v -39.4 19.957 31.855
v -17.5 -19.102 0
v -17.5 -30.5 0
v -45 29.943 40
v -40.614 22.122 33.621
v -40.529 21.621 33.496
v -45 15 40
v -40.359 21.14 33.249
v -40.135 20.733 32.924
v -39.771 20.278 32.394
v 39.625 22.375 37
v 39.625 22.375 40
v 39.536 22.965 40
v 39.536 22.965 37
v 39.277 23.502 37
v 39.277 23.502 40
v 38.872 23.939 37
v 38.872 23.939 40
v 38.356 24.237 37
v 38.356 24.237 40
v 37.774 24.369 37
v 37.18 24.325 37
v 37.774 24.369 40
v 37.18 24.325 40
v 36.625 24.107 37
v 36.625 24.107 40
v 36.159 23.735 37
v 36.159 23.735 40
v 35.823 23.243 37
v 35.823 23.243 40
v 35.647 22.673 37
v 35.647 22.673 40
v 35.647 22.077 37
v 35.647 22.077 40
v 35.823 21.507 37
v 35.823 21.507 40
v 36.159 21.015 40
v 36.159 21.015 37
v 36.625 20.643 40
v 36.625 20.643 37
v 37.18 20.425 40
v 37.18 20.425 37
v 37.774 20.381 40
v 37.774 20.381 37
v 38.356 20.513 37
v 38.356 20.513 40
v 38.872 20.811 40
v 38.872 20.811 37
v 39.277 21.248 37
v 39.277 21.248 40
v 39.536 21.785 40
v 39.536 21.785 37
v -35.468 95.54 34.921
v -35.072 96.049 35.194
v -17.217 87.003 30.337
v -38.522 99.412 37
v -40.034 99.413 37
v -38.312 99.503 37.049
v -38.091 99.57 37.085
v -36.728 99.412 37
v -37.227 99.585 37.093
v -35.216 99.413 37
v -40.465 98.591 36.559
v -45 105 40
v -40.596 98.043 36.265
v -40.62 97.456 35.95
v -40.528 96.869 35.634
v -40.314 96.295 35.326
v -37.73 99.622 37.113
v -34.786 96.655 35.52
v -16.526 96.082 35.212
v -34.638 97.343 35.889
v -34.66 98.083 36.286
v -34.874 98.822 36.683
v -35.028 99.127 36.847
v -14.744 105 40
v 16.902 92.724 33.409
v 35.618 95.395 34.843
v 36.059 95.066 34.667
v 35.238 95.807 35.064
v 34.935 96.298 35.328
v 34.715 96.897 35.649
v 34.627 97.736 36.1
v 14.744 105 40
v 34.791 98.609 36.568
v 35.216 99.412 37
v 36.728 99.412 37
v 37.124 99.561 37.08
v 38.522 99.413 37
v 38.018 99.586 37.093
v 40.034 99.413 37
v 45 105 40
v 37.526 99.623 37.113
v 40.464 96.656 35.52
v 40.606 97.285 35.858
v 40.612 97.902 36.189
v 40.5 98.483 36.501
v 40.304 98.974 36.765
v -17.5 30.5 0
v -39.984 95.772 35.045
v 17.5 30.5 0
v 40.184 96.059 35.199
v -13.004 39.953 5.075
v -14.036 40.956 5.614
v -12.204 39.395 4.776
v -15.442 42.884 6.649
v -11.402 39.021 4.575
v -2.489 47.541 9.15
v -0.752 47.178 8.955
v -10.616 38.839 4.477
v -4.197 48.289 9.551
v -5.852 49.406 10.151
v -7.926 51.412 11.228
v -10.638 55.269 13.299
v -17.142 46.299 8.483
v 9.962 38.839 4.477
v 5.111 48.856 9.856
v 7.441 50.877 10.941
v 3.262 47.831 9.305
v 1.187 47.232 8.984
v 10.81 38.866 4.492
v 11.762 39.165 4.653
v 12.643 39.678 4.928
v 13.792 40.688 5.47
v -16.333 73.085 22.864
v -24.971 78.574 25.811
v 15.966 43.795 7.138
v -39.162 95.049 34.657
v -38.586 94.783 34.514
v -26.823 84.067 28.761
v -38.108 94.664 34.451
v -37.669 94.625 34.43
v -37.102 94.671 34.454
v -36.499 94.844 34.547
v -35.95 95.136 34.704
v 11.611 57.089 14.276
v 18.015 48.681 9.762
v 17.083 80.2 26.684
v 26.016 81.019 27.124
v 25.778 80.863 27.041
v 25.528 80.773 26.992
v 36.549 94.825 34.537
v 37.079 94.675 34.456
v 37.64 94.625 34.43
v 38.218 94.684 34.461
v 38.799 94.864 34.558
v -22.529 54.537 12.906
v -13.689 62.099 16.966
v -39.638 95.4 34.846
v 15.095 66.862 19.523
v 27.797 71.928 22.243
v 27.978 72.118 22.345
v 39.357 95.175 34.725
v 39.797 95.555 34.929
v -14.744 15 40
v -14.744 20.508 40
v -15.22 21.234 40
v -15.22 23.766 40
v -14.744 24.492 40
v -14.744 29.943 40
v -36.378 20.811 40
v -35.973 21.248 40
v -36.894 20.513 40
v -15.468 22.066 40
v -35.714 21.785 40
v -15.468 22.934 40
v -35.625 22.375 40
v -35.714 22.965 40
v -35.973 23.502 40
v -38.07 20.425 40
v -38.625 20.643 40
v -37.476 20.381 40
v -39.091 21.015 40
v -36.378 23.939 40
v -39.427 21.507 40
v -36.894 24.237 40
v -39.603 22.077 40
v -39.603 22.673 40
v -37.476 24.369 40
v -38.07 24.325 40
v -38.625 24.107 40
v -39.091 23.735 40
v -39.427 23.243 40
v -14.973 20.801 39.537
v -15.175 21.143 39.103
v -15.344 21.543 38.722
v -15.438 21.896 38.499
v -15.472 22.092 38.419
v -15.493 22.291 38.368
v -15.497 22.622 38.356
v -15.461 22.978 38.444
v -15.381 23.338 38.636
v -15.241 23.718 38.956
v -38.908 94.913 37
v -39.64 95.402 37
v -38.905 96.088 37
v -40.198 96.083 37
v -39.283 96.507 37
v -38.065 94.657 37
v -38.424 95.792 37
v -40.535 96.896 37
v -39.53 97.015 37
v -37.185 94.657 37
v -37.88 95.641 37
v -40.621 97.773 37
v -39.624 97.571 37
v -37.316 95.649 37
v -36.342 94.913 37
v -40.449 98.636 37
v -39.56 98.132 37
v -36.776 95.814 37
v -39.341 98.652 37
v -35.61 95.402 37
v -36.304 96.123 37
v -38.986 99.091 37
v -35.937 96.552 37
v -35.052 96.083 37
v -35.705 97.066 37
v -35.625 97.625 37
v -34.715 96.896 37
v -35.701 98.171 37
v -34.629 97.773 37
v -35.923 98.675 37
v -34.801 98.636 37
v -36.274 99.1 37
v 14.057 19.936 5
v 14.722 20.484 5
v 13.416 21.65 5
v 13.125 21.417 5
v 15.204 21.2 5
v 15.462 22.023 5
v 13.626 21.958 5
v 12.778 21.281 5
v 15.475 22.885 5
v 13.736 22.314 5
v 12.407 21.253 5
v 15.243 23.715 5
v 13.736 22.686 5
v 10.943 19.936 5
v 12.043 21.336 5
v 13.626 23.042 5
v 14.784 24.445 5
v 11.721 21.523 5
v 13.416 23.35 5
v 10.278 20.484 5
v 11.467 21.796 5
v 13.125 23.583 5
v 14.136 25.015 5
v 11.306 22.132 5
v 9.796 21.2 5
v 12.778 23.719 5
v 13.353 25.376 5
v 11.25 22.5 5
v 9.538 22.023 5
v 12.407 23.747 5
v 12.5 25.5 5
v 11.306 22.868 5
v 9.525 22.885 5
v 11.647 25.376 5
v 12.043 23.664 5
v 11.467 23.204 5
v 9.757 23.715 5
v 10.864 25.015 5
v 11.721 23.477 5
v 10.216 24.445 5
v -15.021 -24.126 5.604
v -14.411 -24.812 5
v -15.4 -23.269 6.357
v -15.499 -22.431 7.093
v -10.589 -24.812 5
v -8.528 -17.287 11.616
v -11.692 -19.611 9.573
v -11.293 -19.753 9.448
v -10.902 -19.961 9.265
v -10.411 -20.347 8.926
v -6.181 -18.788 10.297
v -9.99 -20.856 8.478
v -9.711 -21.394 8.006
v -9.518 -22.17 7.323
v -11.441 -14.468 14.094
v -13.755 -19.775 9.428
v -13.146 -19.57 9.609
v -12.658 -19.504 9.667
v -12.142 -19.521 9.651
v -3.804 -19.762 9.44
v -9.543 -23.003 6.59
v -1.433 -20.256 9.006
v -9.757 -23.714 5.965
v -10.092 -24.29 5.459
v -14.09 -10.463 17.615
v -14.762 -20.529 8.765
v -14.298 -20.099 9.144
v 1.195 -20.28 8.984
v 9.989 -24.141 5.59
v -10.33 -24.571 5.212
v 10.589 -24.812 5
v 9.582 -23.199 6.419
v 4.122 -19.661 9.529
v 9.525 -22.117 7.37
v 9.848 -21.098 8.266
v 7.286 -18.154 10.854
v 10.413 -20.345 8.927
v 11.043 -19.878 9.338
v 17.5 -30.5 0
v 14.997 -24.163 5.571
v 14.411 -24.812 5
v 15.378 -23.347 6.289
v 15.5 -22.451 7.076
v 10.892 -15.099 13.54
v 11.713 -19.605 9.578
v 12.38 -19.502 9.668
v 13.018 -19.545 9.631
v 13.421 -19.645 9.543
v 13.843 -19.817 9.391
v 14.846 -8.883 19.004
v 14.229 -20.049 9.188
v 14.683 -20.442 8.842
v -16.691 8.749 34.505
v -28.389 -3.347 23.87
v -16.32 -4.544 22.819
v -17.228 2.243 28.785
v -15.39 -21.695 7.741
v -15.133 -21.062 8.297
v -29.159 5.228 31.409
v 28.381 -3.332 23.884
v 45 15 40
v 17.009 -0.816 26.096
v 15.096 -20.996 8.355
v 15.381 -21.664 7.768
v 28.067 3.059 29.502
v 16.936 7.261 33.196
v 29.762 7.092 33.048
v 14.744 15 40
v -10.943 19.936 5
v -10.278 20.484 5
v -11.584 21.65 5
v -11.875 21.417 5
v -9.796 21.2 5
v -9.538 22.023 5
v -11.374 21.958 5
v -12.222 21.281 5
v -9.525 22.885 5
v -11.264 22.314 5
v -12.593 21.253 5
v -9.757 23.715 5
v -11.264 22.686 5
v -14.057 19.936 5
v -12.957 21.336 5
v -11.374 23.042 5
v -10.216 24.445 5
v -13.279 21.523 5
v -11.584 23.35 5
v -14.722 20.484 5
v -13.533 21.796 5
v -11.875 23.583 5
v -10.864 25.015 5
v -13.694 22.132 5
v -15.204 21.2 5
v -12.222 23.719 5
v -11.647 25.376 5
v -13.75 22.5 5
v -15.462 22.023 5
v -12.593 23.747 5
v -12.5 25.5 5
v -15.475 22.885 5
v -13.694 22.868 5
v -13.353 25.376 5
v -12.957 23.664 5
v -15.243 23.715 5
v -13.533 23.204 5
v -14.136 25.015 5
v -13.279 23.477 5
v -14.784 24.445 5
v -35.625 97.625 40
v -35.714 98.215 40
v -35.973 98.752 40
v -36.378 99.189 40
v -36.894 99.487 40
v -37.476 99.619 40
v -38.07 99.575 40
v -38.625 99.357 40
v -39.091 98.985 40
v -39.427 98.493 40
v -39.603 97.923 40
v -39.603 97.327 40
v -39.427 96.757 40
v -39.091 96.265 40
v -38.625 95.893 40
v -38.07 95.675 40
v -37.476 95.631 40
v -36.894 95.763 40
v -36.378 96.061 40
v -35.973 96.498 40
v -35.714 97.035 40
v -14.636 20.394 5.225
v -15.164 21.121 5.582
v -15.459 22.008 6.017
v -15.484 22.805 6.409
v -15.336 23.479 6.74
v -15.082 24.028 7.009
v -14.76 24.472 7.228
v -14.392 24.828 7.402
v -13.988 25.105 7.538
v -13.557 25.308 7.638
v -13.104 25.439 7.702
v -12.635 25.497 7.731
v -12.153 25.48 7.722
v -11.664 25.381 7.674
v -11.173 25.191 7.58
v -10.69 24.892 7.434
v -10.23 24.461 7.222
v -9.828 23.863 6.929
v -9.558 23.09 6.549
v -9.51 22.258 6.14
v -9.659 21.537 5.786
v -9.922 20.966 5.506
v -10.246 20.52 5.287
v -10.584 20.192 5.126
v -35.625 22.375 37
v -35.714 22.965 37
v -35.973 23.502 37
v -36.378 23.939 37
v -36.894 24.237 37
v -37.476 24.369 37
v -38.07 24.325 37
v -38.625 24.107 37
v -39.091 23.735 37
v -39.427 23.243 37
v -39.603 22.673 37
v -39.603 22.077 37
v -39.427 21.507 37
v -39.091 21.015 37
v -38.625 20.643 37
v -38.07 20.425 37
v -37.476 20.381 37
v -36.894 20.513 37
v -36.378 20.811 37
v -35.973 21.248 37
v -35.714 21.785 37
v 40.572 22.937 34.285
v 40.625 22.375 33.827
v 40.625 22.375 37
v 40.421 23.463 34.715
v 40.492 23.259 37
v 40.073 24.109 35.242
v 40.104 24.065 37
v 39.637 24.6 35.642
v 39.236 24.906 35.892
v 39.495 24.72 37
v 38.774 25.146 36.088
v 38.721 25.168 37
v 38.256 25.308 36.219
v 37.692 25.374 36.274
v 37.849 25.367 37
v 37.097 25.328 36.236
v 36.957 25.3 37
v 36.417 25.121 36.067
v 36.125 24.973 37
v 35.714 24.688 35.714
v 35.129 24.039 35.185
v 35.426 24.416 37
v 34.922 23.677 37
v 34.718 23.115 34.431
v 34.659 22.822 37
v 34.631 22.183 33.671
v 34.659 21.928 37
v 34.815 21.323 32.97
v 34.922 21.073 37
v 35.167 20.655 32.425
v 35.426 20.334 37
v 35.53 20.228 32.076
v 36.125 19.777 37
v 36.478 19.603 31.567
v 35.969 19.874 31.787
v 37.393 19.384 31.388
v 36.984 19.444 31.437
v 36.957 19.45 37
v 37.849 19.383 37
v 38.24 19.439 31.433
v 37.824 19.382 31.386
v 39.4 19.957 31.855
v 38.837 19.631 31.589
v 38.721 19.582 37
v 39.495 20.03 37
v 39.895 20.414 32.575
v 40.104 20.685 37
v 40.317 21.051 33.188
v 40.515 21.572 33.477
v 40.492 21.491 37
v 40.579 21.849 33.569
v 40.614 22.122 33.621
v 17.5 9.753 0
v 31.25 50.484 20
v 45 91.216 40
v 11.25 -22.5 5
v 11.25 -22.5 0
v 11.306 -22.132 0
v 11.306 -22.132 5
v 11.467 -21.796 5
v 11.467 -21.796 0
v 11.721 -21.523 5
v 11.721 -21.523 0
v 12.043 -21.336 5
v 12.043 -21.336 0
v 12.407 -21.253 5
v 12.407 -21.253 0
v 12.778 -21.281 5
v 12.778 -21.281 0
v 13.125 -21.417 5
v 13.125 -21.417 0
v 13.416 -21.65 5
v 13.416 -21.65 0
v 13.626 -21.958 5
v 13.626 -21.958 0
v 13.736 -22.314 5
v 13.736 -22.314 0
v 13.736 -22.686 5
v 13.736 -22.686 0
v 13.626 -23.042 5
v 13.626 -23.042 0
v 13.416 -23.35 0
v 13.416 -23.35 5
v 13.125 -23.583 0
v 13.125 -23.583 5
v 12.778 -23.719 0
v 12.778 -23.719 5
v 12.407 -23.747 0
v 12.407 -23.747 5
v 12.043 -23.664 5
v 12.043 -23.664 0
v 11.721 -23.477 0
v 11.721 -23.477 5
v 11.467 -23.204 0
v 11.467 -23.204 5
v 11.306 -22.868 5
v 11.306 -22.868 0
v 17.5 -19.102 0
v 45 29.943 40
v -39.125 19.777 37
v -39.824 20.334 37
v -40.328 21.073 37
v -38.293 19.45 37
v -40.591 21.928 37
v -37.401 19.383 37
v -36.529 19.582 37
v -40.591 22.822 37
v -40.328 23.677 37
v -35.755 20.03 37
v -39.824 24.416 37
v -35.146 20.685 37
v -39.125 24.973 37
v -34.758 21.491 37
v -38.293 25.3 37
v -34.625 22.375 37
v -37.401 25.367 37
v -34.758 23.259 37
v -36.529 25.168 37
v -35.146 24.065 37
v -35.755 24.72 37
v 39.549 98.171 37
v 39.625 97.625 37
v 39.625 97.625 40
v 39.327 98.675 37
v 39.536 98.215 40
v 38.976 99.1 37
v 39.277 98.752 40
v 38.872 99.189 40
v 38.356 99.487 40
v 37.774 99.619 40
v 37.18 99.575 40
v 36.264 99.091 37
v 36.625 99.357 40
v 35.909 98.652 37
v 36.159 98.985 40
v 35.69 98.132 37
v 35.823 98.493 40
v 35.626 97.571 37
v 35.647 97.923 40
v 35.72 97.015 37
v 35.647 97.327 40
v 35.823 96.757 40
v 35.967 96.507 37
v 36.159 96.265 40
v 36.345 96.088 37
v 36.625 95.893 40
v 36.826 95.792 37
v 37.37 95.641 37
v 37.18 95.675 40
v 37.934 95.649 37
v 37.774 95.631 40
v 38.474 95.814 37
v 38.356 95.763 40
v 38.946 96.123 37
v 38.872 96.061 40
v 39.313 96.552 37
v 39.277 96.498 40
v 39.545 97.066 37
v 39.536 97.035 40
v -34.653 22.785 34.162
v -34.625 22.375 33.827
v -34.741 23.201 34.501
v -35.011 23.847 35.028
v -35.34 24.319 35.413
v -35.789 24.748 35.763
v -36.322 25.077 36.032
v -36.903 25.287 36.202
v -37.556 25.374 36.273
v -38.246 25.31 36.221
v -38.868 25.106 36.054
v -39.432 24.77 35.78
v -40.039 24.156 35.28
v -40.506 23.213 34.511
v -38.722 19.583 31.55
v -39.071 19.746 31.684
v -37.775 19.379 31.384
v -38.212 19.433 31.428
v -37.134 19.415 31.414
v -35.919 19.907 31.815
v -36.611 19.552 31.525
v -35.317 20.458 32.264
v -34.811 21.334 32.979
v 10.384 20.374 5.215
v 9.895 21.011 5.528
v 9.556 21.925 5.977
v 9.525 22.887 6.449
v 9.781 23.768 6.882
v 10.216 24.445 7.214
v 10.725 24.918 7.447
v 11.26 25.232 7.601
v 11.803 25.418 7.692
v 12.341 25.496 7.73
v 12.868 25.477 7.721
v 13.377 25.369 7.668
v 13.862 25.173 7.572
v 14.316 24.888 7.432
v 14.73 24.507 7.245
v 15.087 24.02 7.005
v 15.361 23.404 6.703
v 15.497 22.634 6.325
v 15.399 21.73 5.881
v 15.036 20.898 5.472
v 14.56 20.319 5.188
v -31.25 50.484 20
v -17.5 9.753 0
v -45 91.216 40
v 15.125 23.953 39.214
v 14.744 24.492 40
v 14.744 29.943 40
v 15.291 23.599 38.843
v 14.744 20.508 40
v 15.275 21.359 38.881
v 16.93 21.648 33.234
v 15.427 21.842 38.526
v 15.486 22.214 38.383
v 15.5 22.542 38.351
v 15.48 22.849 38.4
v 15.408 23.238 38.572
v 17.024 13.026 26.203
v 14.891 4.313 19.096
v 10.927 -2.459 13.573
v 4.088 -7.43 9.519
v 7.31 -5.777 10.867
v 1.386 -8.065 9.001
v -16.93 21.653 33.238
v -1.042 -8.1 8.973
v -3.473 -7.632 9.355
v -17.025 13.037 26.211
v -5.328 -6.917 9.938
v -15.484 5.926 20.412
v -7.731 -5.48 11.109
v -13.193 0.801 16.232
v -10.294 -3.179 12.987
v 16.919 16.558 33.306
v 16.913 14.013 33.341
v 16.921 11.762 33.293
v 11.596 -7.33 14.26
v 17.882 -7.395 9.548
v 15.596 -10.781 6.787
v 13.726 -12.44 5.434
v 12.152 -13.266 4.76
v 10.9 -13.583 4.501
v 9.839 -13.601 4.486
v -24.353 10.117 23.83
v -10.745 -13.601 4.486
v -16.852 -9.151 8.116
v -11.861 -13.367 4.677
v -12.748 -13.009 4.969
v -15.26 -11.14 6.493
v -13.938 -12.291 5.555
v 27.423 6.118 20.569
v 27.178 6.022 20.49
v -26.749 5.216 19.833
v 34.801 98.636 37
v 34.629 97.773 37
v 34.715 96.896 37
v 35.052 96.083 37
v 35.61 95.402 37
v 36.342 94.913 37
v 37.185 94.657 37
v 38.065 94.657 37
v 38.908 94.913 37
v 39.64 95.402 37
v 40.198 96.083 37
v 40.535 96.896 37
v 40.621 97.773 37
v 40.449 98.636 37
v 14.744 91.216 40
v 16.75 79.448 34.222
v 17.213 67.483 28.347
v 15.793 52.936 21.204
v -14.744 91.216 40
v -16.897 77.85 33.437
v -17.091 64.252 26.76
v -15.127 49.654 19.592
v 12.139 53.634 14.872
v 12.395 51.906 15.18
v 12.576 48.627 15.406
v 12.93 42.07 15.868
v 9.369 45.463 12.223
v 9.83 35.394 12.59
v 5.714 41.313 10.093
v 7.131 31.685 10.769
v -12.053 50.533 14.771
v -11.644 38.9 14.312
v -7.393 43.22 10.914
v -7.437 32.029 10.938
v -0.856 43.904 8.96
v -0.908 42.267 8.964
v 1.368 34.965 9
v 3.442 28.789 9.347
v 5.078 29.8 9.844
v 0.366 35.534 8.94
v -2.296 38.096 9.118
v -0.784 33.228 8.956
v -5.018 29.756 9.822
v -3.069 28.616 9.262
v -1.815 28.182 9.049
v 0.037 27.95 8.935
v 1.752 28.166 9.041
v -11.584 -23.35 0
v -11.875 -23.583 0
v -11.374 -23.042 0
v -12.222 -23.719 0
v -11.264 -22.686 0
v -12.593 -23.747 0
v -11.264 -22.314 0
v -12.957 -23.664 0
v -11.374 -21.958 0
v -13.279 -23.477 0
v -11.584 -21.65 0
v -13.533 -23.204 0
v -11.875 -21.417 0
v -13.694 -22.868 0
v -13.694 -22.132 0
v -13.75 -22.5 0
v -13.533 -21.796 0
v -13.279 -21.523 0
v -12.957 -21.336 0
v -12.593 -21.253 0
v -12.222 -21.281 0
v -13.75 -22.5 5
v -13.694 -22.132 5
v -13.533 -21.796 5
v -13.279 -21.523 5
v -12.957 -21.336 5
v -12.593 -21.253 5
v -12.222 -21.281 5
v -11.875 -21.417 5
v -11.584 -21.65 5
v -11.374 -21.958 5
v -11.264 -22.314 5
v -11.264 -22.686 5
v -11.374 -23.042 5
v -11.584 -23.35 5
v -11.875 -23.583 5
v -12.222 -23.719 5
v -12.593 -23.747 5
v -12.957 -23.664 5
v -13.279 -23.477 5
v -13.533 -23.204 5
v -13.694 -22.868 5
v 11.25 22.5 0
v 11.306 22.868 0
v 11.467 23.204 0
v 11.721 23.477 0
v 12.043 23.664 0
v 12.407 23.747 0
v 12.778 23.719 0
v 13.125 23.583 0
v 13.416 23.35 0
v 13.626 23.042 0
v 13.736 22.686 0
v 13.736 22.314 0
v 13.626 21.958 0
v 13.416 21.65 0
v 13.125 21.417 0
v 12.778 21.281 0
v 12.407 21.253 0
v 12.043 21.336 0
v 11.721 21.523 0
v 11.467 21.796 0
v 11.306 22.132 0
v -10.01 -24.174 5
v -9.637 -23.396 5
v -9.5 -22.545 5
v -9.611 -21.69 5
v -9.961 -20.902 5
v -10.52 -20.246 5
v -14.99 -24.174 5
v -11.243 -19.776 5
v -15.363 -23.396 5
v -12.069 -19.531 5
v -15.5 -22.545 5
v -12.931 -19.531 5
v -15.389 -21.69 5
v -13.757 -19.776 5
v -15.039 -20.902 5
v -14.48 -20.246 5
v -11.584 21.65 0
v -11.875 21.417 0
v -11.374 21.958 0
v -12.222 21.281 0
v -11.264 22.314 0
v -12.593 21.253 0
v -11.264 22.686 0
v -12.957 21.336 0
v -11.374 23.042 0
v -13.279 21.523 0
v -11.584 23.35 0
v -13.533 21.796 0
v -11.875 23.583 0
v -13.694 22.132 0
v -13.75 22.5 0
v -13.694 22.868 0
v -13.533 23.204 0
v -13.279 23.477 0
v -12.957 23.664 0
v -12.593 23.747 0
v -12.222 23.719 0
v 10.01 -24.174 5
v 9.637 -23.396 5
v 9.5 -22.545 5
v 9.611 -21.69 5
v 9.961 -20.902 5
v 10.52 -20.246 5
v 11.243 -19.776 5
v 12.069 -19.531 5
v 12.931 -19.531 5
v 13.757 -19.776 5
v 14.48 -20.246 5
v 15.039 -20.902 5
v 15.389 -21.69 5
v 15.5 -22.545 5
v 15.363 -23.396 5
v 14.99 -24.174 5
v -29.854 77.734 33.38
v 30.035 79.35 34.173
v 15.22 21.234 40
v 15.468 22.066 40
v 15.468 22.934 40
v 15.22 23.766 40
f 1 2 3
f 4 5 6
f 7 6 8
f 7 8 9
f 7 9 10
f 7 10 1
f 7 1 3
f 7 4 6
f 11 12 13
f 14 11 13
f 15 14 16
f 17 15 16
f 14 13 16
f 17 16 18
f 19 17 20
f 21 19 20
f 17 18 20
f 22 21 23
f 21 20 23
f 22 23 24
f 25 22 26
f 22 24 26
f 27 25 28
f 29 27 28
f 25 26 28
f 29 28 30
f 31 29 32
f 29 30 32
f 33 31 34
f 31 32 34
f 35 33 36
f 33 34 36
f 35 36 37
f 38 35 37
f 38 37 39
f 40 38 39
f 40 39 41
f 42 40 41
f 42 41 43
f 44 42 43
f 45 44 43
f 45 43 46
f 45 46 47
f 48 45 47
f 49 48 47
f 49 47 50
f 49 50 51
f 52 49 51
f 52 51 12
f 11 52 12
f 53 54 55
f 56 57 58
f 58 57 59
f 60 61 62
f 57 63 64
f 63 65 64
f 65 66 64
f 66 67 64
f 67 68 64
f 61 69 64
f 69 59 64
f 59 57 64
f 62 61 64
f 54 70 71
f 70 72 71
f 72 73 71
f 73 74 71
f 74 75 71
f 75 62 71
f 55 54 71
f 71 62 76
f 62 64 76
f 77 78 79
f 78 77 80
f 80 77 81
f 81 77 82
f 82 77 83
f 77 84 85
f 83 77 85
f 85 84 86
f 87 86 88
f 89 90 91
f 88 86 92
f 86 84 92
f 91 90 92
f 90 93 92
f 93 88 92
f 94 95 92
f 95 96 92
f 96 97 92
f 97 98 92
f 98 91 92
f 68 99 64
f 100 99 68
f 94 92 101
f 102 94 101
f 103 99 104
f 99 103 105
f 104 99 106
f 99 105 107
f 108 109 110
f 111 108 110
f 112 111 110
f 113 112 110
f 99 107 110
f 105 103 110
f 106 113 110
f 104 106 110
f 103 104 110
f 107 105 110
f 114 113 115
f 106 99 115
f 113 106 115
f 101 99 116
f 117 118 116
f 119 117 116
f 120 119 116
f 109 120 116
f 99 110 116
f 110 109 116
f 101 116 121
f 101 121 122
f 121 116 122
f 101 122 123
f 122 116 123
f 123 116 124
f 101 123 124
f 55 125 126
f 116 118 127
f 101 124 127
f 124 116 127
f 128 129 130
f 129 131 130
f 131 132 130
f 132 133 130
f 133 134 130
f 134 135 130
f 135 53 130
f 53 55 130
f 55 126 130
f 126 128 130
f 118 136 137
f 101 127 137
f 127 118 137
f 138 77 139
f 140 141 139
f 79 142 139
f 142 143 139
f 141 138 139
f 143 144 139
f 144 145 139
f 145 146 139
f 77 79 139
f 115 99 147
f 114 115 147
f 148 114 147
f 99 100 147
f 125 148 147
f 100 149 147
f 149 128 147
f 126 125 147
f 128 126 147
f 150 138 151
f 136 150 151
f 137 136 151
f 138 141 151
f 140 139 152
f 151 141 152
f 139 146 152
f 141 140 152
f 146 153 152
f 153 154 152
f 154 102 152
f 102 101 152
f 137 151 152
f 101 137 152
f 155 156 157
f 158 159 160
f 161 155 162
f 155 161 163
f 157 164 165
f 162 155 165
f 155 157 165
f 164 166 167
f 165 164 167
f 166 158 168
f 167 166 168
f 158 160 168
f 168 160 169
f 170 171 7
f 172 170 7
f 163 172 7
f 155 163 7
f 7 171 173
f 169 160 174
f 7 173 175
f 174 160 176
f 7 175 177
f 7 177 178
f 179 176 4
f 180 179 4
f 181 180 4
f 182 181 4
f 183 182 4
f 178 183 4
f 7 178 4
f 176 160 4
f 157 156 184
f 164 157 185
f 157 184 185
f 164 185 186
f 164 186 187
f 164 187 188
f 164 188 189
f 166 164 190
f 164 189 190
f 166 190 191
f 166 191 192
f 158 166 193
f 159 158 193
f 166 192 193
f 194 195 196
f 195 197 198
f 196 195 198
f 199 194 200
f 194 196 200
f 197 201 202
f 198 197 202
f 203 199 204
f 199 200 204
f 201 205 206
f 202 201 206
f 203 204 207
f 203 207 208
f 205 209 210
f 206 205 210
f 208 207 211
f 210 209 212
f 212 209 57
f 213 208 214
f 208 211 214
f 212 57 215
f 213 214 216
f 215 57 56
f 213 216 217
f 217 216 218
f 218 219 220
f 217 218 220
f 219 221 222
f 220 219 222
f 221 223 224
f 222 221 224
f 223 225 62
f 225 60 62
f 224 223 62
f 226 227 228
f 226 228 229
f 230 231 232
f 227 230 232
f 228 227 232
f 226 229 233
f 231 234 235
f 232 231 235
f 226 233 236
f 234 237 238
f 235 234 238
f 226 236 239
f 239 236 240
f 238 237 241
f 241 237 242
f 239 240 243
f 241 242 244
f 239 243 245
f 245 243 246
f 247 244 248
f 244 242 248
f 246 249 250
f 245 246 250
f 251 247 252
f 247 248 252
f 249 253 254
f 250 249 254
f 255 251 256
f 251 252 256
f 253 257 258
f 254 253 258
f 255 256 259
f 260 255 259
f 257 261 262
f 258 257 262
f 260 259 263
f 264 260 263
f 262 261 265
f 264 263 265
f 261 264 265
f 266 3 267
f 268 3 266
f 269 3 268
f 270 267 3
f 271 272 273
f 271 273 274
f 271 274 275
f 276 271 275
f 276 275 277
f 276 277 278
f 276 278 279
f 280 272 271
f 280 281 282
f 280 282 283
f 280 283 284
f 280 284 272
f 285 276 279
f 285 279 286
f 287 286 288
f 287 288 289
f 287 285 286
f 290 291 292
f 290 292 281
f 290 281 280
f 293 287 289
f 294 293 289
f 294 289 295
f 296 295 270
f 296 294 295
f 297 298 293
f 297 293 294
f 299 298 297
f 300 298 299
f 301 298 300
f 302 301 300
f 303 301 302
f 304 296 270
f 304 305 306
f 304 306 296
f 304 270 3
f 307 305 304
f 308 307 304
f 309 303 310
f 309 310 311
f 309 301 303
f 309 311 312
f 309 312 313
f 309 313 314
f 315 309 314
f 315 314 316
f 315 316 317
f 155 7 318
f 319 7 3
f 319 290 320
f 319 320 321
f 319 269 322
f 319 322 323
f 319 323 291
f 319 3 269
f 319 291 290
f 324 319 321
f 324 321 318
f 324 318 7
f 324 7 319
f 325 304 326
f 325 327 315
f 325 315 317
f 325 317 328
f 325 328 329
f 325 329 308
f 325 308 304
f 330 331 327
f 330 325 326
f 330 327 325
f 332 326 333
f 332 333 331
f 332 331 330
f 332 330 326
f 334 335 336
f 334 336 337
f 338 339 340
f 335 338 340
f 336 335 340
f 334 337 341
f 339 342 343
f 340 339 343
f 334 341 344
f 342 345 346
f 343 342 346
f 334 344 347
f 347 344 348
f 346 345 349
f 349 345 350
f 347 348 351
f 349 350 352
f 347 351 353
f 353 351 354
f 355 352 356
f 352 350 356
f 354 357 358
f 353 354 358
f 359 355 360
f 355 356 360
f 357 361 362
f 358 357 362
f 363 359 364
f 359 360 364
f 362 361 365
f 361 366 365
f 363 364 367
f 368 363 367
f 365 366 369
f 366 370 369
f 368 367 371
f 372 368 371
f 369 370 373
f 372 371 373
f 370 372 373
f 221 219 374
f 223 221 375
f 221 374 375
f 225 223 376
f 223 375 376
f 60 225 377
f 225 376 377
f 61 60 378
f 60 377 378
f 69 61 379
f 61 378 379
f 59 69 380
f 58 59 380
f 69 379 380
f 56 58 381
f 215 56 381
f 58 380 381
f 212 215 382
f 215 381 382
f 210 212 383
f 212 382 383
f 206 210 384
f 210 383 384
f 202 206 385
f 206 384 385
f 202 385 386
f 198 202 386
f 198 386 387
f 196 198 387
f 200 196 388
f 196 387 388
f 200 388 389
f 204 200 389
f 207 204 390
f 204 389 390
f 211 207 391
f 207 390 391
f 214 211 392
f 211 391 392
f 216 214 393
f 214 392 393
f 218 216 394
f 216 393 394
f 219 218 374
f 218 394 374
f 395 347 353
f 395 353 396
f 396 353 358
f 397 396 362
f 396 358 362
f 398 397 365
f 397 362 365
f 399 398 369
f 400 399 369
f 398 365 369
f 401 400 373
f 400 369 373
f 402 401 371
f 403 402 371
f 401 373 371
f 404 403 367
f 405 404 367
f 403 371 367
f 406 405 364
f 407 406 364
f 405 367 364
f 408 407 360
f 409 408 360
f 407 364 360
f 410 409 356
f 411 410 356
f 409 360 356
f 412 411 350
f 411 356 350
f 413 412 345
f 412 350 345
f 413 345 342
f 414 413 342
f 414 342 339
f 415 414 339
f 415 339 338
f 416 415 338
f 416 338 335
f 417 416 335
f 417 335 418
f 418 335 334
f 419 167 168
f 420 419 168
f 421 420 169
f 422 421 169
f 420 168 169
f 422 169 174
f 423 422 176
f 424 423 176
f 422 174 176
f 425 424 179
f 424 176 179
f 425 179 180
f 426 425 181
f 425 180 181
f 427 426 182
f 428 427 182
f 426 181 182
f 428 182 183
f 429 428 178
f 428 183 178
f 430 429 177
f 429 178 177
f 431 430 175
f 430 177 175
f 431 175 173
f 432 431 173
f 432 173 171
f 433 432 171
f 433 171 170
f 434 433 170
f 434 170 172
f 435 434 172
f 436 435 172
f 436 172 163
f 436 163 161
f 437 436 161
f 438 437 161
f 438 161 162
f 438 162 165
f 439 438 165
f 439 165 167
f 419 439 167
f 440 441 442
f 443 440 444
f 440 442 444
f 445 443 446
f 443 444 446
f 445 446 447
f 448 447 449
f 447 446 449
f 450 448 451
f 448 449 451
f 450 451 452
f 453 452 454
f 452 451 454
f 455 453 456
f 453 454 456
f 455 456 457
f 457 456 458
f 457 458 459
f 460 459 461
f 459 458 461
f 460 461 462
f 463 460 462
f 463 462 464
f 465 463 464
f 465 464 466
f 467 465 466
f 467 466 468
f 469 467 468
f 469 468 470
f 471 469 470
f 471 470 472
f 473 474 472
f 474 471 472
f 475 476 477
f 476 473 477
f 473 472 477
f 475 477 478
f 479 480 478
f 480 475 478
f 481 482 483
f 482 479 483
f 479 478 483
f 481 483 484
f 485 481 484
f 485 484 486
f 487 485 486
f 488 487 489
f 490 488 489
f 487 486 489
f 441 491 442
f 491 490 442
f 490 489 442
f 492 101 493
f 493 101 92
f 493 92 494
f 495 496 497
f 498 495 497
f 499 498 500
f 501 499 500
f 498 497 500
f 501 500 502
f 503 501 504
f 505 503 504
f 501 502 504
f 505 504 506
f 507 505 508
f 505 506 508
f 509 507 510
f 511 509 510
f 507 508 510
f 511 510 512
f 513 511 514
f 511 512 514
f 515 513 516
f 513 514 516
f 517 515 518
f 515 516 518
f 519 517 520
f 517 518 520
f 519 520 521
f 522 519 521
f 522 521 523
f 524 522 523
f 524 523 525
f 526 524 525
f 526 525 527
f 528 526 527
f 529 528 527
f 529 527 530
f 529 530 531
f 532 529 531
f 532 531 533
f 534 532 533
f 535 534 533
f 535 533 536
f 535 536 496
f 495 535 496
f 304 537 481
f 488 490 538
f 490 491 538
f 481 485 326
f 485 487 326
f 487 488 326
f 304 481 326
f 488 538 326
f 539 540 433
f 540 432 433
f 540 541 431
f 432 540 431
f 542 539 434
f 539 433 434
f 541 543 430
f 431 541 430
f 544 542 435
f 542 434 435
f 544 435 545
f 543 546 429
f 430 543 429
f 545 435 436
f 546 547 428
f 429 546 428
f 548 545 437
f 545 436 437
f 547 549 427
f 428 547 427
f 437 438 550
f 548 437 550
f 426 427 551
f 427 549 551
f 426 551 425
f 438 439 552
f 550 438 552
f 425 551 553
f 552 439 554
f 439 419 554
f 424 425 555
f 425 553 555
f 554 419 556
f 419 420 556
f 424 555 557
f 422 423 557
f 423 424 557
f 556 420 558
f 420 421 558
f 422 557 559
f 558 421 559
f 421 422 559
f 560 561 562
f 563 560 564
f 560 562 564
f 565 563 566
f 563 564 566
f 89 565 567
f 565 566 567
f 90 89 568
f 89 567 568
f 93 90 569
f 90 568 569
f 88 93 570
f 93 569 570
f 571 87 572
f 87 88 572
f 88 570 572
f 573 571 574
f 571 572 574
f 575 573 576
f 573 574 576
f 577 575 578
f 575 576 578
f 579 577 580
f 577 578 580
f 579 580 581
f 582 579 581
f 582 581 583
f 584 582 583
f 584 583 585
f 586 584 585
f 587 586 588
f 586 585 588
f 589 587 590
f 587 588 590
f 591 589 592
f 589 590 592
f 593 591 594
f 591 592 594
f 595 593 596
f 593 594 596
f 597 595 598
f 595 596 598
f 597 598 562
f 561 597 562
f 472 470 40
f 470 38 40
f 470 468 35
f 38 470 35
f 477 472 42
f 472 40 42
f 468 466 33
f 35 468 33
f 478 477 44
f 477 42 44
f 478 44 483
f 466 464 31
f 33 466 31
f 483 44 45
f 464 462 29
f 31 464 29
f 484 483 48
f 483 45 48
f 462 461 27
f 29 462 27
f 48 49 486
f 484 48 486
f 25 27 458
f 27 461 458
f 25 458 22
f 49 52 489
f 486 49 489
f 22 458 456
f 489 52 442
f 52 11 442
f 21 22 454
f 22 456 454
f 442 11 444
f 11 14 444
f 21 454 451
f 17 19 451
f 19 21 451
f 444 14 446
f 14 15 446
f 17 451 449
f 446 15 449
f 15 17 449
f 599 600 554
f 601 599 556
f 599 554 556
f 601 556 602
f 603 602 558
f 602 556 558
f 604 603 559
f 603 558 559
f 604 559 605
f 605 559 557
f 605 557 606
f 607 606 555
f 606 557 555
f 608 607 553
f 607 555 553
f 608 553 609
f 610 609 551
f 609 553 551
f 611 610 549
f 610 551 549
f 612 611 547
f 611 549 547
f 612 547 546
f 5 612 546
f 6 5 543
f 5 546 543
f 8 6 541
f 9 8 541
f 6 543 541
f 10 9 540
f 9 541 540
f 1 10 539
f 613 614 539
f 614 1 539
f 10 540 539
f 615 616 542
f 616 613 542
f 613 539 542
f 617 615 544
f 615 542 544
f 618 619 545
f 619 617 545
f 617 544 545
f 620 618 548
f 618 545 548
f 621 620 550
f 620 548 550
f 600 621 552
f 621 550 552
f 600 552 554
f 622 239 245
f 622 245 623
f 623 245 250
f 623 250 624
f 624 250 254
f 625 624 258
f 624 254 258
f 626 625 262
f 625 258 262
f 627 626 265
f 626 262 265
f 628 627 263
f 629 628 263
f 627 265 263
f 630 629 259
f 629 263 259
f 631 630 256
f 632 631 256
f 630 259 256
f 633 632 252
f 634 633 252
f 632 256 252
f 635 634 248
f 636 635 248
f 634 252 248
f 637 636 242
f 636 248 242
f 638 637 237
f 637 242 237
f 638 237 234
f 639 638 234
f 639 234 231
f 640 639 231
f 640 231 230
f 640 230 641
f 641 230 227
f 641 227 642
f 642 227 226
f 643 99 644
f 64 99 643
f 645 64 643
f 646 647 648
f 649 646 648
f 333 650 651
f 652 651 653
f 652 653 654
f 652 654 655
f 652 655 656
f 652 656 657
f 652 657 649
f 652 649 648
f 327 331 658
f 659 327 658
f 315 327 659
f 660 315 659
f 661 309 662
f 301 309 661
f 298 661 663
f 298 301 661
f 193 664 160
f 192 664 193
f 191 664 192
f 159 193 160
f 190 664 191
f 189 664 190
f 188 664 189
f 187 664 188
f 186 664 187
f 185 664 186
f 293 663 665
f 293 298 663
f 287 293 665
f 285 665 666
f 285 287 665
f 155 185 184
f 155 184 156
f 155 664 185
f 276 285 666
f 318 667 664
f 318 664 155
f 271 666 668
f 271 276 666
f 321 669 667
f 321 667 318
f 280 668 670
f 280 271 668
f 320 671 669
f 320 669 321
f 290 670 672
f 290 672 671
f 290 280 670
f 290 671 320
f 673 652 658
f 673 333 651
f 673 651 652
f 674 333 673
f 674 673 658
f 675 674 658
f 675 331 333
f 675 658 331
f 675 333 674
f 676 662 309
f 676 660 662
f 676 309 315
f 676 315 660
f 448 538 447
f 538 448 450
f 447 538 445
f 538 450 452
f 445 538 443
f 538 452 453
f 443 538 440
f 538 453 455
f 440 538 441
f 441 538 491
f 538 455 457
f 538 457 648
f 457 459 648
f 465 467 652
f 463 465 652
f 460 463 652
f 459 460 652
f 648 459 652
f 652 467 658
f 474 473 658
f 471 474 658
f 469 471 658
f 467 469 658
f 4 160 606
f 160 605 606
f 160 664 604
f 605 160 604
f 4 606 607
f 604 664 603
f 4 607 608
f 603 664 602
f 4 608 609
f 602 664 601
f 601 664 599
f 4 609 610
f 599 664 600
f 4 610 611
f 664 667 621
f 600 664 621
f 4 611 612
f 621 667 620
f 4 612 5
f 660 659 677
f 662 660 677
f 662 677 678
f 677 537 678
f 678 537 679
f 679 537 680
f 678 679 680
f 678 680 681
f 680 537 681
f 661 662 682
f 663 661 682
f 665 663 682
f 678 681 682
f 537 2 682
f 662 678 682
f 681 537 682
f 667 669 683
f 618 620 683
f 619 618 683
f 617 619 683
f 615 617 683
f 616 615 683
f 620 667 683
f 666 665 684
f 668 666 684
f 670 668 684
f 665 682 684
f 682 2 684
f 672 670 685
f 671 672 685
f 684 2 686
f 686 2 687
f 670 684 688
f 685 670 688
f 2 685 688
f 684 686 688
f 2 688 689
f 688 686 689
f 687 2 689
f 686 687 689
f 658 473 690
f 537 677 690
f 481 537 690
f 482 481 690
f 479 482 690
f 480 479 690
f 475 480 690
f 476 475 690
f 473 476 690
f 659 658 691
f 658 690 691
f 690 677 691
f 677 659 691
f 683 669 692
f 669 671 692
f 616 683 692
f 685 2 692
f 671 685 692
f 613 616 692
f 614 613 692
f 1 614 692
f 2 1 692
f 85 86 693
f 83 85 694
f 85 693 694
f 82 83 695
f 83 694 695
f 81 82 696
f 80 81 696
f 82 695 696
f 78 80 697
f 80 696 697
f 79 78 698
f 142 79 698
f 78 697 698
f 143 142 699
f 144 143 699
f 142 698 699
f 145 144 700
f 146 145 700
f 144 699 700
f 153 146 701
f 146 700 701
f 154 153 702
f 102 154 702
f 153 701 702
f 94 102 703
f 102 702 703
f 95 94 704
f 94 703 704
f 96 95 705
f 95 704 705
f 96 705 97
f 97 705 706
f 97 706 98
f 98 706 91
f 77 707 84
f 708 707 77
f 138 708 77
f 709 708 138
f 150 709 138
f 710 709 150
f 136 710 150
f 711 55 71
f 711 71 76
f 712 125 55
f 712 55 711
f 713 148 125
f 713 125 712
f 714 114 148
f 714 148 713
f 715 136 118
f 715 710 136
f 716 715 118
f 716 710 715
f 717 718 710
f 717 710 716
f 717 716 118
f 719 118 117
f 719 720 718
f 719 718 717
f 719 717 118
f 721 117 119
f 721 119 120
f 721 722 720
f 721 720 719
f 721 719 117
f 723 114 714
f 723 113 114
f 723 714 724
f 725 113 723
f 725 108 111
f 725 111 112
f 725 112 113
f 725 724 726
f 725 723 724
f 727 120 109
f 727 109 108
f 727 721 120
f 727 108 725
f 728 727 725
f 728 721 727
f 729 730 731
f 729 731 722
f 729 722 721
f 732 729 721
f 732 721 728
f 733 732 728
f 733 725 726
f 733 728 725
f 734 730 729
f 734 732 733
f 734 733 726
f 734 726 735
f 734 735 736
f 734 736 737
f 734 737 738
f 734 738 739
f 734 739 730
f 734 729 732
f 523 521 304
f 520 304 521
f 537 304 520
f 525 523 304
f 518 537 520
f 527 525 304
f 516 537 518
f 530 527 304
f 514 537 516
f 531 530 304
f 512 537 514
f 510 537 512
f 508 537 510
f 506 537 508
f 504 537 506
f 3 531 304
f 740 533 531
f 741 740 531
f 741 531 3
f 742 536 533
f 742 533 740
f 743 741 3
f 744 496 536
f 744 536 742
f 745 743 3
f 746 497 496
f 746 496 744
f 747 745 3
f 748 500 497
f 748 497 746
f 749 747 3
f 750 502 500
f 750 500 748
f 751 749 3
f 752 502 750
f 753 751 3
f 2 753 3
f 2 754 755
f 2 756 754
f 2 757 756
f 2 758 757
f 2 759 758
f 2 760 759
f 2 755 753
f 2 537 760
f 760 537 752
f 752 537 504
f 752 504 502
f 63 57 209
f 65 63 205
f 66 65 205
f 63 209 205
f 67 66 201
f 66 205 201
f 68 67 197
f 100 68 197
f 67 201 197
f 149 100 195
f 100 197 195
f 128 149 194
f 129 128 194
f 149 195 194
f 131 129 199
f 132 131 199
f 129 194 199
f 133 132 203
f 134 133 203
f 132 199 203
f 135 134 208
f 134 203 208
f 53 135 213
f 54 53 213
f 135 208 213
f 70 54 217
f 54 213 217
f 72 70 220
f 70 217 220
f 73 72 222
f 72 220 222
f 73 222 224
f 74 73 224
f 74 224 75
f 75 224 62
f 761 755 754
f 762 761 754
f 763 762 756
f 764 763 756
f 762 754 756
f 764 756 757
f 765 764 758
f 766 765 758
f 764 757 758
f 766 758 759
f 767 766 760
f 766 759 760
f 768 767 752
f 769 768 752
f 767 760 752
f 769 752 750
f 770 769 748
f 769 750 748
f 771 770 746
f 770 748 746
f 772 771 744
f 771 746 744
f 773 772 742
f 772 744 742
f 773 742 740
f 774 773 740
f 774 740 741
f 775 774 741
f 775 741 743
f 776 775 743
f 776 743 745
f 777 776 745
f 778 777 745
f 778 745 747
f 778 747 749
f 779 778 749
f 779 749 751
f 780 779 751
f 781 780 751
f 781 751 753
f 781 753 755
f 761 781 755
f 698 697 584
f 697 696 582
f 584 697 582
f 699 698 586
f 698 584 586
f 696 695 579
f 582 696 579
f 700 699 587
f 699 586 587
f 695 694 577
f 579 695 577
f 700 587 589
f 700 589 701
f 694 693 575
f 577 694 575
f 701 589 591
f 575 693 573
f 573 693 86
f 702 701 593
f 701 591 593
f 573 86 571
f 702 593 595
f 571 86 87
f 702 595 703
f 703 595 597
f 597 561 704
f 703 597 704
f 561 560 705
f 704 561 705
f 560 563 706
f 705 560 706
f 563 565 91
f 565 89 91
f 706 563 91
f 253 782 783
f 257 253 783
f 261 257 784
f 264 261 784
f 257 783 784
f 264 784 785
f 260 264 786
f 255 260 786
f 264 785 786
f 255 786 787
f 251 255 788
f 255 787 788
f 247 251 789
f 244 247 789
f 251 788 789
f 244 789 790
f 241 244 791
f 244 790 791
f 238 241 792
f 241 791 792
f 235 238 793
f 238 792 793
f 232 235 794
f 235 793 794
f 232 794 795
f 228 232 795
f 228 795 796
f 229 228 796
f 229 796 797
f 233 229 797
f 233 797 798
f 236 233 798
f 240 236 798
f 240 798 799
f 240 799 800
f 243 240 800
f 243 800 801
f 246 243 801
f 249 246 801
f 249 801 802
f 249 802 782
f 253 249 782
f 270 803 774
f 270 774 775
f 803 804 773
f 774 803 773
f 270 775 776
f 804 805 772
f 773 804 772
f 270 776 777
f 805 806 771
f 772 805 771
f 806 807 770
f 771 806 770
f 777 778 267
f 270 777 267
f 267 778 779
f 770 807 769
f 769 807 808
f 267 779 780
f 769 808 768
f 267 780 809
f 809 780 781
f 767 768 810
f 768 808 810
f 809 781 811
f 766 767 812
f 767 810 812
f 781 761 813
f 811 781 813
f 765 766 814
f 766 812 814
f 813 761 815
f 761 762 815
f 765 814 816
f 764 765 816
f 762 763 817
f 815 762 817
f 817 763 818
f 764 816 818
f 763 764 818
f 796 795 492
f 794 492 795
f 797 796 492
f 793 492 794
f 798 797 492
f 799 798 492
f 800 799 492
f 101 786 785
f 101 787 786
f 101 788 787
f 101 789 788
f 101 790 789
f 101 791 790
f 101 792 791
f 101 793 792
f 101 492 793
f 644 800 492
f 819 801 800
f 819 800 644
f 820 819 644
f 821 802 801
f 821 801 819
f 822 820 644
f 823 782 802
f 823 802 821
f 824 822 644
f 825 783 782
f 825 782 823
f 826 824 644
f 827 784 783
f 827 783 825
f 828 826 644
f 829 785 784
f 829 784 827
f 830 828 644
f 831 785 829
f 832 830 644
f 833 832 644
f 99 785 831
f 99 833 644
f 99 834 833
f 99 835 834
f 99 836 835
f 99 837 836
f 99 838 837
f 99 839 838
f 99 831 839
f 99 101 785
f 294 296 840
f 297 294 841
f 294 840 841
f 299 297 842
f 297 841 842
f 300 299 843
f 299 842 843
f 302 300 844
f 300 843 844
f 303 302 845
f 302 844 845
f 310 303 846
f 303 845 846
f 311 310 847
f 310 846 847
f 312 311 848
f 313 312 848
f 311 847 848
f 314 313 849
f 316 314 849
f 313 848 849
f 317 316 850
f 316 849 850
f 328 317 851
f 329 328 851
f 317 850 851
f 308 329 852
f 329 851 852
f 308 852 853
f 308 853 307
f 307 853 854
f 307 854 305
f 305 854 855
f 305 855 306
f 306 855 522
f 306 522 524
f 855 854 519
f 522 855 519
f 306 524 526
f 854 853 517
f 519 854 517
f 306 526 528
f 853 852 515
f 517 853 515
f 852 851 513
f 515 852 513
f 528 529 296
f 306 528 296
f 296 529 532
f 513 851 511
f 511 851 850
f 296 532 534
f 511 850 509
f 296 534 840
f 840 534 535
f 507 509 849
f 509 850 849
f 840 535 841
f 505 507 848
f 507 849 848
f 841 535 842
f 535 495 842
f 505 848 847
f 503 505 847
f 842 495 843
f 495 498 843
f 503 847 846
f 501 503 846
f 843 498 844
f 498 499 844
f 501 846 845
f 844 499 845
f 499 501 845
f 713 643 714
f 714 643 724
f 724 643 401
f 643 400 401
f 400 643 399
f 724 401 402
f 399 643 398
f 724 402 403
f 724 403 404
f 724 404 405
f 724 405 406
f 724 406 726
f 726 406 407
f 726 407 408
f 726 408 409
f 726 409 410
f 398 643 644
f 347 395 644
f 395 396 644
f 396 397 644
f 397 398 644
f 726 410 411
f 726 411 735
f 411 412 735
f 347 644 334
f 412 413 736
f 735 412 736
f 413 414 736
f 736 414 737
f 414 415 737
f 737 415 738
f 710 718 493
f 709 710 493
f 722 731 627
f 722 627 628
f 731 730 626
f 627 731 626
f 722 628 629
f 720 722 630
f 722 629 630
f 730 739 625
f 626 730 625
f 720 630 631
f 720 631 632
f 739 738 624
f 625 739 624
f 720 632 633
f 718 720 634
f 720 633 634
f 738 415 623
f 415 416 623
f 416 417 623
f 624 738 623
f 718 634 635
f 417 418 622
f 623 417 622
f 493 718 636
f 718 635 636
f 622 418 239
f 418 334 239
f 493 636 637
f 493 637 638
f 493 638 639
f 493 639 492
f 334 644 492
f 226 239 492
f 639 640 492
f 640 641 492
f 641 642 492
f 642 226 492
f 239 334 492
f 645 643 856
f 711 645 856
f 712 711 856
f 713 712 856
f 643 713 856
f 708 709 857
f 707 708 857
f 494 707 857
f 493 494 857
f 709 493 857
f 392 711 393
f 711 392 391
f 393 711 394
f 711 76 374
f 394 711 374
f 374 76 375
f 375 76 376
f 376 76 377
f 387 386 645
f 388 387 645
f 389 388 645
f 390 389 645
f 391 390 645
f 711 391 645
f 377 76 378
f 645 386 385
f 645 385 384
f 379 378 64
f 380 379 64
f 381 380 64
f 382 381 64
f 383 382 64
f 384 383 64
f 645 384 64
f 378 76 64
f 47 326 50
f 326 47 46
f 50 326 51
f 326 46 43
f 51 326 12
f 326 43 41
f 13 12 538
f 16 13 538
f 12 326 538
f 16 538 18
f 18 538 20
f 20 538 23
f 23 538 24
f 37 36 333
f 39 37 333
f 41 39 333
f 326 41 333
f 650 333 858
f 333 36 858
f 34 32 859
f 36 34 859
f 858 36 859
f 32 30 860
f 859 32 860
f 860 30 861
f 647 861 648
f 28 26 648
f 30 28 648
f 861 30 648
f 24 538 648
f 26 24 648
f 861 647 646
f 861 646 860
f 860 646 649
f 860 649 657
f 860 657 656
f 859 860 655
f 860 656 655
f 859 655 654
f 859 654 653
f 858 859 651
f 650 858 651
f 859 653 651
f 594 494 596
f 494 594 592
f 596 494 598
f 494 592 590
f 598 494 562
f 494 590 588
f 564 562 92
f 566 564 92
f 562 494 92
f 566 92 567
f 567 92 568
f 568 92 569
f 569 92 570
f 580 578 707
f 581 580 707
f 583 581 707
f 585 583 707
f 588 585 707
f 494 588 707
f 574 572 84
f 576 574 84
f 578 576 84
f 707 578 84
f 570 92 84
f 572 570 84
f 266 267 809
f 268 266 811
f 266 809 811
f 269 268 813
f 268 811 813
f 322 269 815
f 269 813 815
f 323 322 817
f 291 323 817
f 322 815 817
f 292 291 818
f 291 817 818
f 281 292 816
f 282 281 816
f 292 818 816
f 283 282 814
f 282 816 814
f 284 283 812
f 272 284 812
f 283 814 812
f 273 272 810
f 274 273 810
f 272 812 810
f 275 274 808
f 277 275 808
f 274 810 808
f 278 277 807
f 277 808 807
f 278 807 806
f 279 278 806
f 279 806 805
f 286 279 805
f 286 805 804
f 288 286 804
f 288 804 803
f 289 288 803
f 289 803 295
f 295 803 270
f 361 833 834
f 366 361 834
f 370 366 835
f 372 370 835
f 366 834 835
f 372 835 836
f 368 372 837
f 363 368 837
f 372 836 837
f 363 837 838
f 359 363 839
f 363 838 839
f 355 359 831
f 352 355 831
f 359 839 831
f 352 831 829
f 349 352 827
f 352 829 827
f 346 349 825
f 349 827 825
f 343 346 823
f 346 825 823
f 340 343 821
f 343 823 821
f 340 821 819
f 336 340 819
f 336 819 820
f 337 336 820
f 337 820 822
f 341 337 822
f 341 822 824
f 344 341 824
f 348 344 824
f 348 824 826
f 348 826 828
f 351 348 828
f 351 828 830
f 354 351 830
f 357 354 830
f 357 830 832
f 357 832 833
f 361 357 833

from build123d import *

# Parameters (mm, degrees)
SKETCH_5_R               = 1.25
CUT_EXTRUDE_1_DEPTH      = 122.037184526
CUT_EXTRUDE_START        = -5
SKETCH_6_R               = 3
CUT_EXTRUDE_2_DEPTH      = 117.037184526
SKETCH_7_R               = 2
CUT_EXTRUDE_3_DEPTH      = 122.037184526
CUT_EXTRUDE_START_2      = -3
SKETCH_8_R               = 3
CUT_EXTRUDE_4_DEPTH      = 119.037184526
CUT_EXTRUDE_5_DEPTH      = 122.037184526
CUT_EXTRUDE_5_DEPTH_BACK = 122.037184526
SKETCH_12_RX             = 20.465266771
SKETCH_12_RY             = 17.235422909


with BuildPart() as part:
    # Loft 1: read off the stored shape, not the designer's step
    # Loft 1: loft between two sections, ruled curve by curve
    loft_1_from = [
        Edge.make_line((-17.5, 30.5, 0), (17.5, 30.5, 0)),
        Edge.make_line((17.5, 30.5, 0), (17.5, -30.5, 0)),
        Edge.make_line((-17.5, -30.5, 0), (17.5, -30.5, 0)),
        Edge.make_line((-17.5, 30.5, 0), (-17.5, -30.5, 0)),
    ]
    loft_1_to = [
        Edge.make_line((-45, 105, 40), (45, 105, 40)),
        Edge.make_line((45, 105, 40), (45, 15, 40)),
        Edge.make_line((-45, 15, 40), (45, 15, 40)),
        Edge.make_line((-45, 105, 40), (-45, 15, 40)),
    ]
    loft_1 = Solid(Shell([*[Face.make_surface_from_curves(loft_1_from[k], loft_1_to[k]) for k in range(4)], Face(Wire(loft_1_from)), Face(Wire(loft_1_to))]))
    add(loft_1)

    # 草图5 → 切除-拉伸1 (cut, through all)
    with BuildSketch(Plane(origin=(0, 0, 0), x_dir=(-1, 0, 0), z_dir=(0, 0, -1))):
        with Locations((-12.5, 22.5)):
            Circle(SKETCH_5_R)
        with Locations((12.5, 22.5)):
            Circle(SKETCH_5_R)
        with Locations((12.5, -22.5)):
            Circle(SKETCH_5_R)
        with Locations((-12.5, -22.5)):
            Circle(SKETCH_5_R)
    extrude(amount=-CUT_EXTRUDE_1_DEPTH, mode=Mode.SUBTRACT)

    # 草图6 → 切除-拉伸2 (cut, through all)
    with BuildSketch(Plane(origin=(0, 0, 0), x_dir=(-1, 0, 0), z_dir=(0, 0, -1)).offset(CUT_EXTRUDE_START)):
        with Locations((-12.5, 22.5)):
            Circle(SKETCH_6_R)
        with Locations((12.5, 22.5)):
            Circle(SKETCH_6_R)
        with Locations((-12.5, -22.5)):
            Circle(SKETCH_6_R)
        with Locations((12.5, -22.5)):
            Circle(SKETCH_6_R)
    extrude(amount=-CUT_EXTRUDE_2_DEPTH, mode=Mode.SUBTRACT)

    # 草图7 → 切除-拉伸3 (cut, through all)
    with BuildSketch(Plane.XY.offset(40)):
        with Locations((37.625, 22.375)):
            Circle(SKETCH_7_R)
        with Locations((-37.625, 22.375)):
            Circle(SKETCH_7_R)
        with Locations((-37.625, 97.625)):
            Circle(SKETCH_7_R)
        with Locations((37.625, 97.625)):
            Circle(SKETCH_7_R)
    extrude(amount=-CUT_EXTRUDE_3_DEPTH, mode=Mode.SUBTRACT)

    # 草图8 → 切除-拉伸4 (cut, through all)
    with BuildSketch(Plane.XY.offset(40).offset(CUT_EXTRUDE_START_2)):
        with Locations((-37.625, 97.625)):
            Circle(SKETCH_8_R)
        with Locations((37.625, 97.625)):
            Circle(SKETCH_8_R)
        with Locations((37.625, 22.375)):
            Circle(SKETCH_8_R)
        with Locations((-37.625, 22.375)):
            Circle(SKETCH_8_R)
    extrude(amount=-CUT_EXTRUDE_4_DEPTH, mode=Mode.SUBTRACT)

    # 草图11 → Loft 1 2 section 0
    with BuildSketch(Plane.XY.offset(40)):
        with BuildLine():
            Line((-45, 91.216125502), (45, 91.216125502))
            Line((45, 91.216125502), (45, 29.943379718))
            Line((45, 29.943379718), (-45, 29.943379718))
            Line((-45, 29.943379718), (-45, 91.216125502))
        make_face()
    # 草图9 → Loft 1 2 section 1
    with BuildSketch(Plane(origin=(0, 0, 0), x_dir=(-1, 0, 0), z_dir=(0, 0, -1))):
        with BuildLine():
            Line((-17.5, 9.752727906), (17.5, 9.752727906))
            Line((17.5, 9.752727906), (17.5, -19.101844067))
            Line((17.5, -19.101844067), (-17.5, -19.101844067))
            Line((-17.5, -19.101844067), (-17.5, 9.752727906))
        make_face()
    loft(mode=Mode.SUBTRACT)


with BuildPart() as loft_1_2_piece_1:
    # of the separate pieces the step leaves, piece 1, a body of its own (loft_1_2_pieces)
    add(part.part.solids().sort_by_distance((-17.5, 30.5, 0))[0])


with BuildPart() as loft_1_2_piece_2:
    # of the separate pieces the step leaves, piece 2, a body of its own (loft_1_2_pieces)
    add(part.part.solids().sort_by_distance((-17.5, -19.101844067, 0))[0])


with BuildPart() as cut_extrude_5_tool:
    # 草图12 → 切除-拉伸5 (new, two sides: drawn at the far end of the back side and taken through both)
    with BuildSketch(Plane(origin=(0, 0, 0), x_dir=(1, 0, 0), z_dir=(0, 1, 0)).offset(-CUT_EXTRUDE_5_DEPTH_BACK)):
        with Locations(Location((0, -29.400447007), (0, 0, -90))):
            Ellipse(SKETCH_12_RX, SKETCH_12_RY)
    extrude(amount=CUT_EXTRUDE_5_DEPTH + CUT_EXTRUDE_5_DEPTH_BACK)


with BuildPart() as loft_1_2_piece_1_1:
    add(loft_1_2_piece_1.part)

    # 切除-拉伸5: cut by cut_extrude_5_tool
    add(cut_extrude_5_tool.part, mode=Mode.SUBTRACT)


with BuildPart() as loft_1_2_piece_2_1:
    add(loft_1_2_piece_2.part)

    # 切除-拉伸5: cut by cut_extrude_5_tool
    add(cut_extrude_5_tool.part, mode=Mode.SUBTRACT)


solid = Compound([loft_1_2_piece_1_1.part, loft_1_2_piece_2_1.part])
